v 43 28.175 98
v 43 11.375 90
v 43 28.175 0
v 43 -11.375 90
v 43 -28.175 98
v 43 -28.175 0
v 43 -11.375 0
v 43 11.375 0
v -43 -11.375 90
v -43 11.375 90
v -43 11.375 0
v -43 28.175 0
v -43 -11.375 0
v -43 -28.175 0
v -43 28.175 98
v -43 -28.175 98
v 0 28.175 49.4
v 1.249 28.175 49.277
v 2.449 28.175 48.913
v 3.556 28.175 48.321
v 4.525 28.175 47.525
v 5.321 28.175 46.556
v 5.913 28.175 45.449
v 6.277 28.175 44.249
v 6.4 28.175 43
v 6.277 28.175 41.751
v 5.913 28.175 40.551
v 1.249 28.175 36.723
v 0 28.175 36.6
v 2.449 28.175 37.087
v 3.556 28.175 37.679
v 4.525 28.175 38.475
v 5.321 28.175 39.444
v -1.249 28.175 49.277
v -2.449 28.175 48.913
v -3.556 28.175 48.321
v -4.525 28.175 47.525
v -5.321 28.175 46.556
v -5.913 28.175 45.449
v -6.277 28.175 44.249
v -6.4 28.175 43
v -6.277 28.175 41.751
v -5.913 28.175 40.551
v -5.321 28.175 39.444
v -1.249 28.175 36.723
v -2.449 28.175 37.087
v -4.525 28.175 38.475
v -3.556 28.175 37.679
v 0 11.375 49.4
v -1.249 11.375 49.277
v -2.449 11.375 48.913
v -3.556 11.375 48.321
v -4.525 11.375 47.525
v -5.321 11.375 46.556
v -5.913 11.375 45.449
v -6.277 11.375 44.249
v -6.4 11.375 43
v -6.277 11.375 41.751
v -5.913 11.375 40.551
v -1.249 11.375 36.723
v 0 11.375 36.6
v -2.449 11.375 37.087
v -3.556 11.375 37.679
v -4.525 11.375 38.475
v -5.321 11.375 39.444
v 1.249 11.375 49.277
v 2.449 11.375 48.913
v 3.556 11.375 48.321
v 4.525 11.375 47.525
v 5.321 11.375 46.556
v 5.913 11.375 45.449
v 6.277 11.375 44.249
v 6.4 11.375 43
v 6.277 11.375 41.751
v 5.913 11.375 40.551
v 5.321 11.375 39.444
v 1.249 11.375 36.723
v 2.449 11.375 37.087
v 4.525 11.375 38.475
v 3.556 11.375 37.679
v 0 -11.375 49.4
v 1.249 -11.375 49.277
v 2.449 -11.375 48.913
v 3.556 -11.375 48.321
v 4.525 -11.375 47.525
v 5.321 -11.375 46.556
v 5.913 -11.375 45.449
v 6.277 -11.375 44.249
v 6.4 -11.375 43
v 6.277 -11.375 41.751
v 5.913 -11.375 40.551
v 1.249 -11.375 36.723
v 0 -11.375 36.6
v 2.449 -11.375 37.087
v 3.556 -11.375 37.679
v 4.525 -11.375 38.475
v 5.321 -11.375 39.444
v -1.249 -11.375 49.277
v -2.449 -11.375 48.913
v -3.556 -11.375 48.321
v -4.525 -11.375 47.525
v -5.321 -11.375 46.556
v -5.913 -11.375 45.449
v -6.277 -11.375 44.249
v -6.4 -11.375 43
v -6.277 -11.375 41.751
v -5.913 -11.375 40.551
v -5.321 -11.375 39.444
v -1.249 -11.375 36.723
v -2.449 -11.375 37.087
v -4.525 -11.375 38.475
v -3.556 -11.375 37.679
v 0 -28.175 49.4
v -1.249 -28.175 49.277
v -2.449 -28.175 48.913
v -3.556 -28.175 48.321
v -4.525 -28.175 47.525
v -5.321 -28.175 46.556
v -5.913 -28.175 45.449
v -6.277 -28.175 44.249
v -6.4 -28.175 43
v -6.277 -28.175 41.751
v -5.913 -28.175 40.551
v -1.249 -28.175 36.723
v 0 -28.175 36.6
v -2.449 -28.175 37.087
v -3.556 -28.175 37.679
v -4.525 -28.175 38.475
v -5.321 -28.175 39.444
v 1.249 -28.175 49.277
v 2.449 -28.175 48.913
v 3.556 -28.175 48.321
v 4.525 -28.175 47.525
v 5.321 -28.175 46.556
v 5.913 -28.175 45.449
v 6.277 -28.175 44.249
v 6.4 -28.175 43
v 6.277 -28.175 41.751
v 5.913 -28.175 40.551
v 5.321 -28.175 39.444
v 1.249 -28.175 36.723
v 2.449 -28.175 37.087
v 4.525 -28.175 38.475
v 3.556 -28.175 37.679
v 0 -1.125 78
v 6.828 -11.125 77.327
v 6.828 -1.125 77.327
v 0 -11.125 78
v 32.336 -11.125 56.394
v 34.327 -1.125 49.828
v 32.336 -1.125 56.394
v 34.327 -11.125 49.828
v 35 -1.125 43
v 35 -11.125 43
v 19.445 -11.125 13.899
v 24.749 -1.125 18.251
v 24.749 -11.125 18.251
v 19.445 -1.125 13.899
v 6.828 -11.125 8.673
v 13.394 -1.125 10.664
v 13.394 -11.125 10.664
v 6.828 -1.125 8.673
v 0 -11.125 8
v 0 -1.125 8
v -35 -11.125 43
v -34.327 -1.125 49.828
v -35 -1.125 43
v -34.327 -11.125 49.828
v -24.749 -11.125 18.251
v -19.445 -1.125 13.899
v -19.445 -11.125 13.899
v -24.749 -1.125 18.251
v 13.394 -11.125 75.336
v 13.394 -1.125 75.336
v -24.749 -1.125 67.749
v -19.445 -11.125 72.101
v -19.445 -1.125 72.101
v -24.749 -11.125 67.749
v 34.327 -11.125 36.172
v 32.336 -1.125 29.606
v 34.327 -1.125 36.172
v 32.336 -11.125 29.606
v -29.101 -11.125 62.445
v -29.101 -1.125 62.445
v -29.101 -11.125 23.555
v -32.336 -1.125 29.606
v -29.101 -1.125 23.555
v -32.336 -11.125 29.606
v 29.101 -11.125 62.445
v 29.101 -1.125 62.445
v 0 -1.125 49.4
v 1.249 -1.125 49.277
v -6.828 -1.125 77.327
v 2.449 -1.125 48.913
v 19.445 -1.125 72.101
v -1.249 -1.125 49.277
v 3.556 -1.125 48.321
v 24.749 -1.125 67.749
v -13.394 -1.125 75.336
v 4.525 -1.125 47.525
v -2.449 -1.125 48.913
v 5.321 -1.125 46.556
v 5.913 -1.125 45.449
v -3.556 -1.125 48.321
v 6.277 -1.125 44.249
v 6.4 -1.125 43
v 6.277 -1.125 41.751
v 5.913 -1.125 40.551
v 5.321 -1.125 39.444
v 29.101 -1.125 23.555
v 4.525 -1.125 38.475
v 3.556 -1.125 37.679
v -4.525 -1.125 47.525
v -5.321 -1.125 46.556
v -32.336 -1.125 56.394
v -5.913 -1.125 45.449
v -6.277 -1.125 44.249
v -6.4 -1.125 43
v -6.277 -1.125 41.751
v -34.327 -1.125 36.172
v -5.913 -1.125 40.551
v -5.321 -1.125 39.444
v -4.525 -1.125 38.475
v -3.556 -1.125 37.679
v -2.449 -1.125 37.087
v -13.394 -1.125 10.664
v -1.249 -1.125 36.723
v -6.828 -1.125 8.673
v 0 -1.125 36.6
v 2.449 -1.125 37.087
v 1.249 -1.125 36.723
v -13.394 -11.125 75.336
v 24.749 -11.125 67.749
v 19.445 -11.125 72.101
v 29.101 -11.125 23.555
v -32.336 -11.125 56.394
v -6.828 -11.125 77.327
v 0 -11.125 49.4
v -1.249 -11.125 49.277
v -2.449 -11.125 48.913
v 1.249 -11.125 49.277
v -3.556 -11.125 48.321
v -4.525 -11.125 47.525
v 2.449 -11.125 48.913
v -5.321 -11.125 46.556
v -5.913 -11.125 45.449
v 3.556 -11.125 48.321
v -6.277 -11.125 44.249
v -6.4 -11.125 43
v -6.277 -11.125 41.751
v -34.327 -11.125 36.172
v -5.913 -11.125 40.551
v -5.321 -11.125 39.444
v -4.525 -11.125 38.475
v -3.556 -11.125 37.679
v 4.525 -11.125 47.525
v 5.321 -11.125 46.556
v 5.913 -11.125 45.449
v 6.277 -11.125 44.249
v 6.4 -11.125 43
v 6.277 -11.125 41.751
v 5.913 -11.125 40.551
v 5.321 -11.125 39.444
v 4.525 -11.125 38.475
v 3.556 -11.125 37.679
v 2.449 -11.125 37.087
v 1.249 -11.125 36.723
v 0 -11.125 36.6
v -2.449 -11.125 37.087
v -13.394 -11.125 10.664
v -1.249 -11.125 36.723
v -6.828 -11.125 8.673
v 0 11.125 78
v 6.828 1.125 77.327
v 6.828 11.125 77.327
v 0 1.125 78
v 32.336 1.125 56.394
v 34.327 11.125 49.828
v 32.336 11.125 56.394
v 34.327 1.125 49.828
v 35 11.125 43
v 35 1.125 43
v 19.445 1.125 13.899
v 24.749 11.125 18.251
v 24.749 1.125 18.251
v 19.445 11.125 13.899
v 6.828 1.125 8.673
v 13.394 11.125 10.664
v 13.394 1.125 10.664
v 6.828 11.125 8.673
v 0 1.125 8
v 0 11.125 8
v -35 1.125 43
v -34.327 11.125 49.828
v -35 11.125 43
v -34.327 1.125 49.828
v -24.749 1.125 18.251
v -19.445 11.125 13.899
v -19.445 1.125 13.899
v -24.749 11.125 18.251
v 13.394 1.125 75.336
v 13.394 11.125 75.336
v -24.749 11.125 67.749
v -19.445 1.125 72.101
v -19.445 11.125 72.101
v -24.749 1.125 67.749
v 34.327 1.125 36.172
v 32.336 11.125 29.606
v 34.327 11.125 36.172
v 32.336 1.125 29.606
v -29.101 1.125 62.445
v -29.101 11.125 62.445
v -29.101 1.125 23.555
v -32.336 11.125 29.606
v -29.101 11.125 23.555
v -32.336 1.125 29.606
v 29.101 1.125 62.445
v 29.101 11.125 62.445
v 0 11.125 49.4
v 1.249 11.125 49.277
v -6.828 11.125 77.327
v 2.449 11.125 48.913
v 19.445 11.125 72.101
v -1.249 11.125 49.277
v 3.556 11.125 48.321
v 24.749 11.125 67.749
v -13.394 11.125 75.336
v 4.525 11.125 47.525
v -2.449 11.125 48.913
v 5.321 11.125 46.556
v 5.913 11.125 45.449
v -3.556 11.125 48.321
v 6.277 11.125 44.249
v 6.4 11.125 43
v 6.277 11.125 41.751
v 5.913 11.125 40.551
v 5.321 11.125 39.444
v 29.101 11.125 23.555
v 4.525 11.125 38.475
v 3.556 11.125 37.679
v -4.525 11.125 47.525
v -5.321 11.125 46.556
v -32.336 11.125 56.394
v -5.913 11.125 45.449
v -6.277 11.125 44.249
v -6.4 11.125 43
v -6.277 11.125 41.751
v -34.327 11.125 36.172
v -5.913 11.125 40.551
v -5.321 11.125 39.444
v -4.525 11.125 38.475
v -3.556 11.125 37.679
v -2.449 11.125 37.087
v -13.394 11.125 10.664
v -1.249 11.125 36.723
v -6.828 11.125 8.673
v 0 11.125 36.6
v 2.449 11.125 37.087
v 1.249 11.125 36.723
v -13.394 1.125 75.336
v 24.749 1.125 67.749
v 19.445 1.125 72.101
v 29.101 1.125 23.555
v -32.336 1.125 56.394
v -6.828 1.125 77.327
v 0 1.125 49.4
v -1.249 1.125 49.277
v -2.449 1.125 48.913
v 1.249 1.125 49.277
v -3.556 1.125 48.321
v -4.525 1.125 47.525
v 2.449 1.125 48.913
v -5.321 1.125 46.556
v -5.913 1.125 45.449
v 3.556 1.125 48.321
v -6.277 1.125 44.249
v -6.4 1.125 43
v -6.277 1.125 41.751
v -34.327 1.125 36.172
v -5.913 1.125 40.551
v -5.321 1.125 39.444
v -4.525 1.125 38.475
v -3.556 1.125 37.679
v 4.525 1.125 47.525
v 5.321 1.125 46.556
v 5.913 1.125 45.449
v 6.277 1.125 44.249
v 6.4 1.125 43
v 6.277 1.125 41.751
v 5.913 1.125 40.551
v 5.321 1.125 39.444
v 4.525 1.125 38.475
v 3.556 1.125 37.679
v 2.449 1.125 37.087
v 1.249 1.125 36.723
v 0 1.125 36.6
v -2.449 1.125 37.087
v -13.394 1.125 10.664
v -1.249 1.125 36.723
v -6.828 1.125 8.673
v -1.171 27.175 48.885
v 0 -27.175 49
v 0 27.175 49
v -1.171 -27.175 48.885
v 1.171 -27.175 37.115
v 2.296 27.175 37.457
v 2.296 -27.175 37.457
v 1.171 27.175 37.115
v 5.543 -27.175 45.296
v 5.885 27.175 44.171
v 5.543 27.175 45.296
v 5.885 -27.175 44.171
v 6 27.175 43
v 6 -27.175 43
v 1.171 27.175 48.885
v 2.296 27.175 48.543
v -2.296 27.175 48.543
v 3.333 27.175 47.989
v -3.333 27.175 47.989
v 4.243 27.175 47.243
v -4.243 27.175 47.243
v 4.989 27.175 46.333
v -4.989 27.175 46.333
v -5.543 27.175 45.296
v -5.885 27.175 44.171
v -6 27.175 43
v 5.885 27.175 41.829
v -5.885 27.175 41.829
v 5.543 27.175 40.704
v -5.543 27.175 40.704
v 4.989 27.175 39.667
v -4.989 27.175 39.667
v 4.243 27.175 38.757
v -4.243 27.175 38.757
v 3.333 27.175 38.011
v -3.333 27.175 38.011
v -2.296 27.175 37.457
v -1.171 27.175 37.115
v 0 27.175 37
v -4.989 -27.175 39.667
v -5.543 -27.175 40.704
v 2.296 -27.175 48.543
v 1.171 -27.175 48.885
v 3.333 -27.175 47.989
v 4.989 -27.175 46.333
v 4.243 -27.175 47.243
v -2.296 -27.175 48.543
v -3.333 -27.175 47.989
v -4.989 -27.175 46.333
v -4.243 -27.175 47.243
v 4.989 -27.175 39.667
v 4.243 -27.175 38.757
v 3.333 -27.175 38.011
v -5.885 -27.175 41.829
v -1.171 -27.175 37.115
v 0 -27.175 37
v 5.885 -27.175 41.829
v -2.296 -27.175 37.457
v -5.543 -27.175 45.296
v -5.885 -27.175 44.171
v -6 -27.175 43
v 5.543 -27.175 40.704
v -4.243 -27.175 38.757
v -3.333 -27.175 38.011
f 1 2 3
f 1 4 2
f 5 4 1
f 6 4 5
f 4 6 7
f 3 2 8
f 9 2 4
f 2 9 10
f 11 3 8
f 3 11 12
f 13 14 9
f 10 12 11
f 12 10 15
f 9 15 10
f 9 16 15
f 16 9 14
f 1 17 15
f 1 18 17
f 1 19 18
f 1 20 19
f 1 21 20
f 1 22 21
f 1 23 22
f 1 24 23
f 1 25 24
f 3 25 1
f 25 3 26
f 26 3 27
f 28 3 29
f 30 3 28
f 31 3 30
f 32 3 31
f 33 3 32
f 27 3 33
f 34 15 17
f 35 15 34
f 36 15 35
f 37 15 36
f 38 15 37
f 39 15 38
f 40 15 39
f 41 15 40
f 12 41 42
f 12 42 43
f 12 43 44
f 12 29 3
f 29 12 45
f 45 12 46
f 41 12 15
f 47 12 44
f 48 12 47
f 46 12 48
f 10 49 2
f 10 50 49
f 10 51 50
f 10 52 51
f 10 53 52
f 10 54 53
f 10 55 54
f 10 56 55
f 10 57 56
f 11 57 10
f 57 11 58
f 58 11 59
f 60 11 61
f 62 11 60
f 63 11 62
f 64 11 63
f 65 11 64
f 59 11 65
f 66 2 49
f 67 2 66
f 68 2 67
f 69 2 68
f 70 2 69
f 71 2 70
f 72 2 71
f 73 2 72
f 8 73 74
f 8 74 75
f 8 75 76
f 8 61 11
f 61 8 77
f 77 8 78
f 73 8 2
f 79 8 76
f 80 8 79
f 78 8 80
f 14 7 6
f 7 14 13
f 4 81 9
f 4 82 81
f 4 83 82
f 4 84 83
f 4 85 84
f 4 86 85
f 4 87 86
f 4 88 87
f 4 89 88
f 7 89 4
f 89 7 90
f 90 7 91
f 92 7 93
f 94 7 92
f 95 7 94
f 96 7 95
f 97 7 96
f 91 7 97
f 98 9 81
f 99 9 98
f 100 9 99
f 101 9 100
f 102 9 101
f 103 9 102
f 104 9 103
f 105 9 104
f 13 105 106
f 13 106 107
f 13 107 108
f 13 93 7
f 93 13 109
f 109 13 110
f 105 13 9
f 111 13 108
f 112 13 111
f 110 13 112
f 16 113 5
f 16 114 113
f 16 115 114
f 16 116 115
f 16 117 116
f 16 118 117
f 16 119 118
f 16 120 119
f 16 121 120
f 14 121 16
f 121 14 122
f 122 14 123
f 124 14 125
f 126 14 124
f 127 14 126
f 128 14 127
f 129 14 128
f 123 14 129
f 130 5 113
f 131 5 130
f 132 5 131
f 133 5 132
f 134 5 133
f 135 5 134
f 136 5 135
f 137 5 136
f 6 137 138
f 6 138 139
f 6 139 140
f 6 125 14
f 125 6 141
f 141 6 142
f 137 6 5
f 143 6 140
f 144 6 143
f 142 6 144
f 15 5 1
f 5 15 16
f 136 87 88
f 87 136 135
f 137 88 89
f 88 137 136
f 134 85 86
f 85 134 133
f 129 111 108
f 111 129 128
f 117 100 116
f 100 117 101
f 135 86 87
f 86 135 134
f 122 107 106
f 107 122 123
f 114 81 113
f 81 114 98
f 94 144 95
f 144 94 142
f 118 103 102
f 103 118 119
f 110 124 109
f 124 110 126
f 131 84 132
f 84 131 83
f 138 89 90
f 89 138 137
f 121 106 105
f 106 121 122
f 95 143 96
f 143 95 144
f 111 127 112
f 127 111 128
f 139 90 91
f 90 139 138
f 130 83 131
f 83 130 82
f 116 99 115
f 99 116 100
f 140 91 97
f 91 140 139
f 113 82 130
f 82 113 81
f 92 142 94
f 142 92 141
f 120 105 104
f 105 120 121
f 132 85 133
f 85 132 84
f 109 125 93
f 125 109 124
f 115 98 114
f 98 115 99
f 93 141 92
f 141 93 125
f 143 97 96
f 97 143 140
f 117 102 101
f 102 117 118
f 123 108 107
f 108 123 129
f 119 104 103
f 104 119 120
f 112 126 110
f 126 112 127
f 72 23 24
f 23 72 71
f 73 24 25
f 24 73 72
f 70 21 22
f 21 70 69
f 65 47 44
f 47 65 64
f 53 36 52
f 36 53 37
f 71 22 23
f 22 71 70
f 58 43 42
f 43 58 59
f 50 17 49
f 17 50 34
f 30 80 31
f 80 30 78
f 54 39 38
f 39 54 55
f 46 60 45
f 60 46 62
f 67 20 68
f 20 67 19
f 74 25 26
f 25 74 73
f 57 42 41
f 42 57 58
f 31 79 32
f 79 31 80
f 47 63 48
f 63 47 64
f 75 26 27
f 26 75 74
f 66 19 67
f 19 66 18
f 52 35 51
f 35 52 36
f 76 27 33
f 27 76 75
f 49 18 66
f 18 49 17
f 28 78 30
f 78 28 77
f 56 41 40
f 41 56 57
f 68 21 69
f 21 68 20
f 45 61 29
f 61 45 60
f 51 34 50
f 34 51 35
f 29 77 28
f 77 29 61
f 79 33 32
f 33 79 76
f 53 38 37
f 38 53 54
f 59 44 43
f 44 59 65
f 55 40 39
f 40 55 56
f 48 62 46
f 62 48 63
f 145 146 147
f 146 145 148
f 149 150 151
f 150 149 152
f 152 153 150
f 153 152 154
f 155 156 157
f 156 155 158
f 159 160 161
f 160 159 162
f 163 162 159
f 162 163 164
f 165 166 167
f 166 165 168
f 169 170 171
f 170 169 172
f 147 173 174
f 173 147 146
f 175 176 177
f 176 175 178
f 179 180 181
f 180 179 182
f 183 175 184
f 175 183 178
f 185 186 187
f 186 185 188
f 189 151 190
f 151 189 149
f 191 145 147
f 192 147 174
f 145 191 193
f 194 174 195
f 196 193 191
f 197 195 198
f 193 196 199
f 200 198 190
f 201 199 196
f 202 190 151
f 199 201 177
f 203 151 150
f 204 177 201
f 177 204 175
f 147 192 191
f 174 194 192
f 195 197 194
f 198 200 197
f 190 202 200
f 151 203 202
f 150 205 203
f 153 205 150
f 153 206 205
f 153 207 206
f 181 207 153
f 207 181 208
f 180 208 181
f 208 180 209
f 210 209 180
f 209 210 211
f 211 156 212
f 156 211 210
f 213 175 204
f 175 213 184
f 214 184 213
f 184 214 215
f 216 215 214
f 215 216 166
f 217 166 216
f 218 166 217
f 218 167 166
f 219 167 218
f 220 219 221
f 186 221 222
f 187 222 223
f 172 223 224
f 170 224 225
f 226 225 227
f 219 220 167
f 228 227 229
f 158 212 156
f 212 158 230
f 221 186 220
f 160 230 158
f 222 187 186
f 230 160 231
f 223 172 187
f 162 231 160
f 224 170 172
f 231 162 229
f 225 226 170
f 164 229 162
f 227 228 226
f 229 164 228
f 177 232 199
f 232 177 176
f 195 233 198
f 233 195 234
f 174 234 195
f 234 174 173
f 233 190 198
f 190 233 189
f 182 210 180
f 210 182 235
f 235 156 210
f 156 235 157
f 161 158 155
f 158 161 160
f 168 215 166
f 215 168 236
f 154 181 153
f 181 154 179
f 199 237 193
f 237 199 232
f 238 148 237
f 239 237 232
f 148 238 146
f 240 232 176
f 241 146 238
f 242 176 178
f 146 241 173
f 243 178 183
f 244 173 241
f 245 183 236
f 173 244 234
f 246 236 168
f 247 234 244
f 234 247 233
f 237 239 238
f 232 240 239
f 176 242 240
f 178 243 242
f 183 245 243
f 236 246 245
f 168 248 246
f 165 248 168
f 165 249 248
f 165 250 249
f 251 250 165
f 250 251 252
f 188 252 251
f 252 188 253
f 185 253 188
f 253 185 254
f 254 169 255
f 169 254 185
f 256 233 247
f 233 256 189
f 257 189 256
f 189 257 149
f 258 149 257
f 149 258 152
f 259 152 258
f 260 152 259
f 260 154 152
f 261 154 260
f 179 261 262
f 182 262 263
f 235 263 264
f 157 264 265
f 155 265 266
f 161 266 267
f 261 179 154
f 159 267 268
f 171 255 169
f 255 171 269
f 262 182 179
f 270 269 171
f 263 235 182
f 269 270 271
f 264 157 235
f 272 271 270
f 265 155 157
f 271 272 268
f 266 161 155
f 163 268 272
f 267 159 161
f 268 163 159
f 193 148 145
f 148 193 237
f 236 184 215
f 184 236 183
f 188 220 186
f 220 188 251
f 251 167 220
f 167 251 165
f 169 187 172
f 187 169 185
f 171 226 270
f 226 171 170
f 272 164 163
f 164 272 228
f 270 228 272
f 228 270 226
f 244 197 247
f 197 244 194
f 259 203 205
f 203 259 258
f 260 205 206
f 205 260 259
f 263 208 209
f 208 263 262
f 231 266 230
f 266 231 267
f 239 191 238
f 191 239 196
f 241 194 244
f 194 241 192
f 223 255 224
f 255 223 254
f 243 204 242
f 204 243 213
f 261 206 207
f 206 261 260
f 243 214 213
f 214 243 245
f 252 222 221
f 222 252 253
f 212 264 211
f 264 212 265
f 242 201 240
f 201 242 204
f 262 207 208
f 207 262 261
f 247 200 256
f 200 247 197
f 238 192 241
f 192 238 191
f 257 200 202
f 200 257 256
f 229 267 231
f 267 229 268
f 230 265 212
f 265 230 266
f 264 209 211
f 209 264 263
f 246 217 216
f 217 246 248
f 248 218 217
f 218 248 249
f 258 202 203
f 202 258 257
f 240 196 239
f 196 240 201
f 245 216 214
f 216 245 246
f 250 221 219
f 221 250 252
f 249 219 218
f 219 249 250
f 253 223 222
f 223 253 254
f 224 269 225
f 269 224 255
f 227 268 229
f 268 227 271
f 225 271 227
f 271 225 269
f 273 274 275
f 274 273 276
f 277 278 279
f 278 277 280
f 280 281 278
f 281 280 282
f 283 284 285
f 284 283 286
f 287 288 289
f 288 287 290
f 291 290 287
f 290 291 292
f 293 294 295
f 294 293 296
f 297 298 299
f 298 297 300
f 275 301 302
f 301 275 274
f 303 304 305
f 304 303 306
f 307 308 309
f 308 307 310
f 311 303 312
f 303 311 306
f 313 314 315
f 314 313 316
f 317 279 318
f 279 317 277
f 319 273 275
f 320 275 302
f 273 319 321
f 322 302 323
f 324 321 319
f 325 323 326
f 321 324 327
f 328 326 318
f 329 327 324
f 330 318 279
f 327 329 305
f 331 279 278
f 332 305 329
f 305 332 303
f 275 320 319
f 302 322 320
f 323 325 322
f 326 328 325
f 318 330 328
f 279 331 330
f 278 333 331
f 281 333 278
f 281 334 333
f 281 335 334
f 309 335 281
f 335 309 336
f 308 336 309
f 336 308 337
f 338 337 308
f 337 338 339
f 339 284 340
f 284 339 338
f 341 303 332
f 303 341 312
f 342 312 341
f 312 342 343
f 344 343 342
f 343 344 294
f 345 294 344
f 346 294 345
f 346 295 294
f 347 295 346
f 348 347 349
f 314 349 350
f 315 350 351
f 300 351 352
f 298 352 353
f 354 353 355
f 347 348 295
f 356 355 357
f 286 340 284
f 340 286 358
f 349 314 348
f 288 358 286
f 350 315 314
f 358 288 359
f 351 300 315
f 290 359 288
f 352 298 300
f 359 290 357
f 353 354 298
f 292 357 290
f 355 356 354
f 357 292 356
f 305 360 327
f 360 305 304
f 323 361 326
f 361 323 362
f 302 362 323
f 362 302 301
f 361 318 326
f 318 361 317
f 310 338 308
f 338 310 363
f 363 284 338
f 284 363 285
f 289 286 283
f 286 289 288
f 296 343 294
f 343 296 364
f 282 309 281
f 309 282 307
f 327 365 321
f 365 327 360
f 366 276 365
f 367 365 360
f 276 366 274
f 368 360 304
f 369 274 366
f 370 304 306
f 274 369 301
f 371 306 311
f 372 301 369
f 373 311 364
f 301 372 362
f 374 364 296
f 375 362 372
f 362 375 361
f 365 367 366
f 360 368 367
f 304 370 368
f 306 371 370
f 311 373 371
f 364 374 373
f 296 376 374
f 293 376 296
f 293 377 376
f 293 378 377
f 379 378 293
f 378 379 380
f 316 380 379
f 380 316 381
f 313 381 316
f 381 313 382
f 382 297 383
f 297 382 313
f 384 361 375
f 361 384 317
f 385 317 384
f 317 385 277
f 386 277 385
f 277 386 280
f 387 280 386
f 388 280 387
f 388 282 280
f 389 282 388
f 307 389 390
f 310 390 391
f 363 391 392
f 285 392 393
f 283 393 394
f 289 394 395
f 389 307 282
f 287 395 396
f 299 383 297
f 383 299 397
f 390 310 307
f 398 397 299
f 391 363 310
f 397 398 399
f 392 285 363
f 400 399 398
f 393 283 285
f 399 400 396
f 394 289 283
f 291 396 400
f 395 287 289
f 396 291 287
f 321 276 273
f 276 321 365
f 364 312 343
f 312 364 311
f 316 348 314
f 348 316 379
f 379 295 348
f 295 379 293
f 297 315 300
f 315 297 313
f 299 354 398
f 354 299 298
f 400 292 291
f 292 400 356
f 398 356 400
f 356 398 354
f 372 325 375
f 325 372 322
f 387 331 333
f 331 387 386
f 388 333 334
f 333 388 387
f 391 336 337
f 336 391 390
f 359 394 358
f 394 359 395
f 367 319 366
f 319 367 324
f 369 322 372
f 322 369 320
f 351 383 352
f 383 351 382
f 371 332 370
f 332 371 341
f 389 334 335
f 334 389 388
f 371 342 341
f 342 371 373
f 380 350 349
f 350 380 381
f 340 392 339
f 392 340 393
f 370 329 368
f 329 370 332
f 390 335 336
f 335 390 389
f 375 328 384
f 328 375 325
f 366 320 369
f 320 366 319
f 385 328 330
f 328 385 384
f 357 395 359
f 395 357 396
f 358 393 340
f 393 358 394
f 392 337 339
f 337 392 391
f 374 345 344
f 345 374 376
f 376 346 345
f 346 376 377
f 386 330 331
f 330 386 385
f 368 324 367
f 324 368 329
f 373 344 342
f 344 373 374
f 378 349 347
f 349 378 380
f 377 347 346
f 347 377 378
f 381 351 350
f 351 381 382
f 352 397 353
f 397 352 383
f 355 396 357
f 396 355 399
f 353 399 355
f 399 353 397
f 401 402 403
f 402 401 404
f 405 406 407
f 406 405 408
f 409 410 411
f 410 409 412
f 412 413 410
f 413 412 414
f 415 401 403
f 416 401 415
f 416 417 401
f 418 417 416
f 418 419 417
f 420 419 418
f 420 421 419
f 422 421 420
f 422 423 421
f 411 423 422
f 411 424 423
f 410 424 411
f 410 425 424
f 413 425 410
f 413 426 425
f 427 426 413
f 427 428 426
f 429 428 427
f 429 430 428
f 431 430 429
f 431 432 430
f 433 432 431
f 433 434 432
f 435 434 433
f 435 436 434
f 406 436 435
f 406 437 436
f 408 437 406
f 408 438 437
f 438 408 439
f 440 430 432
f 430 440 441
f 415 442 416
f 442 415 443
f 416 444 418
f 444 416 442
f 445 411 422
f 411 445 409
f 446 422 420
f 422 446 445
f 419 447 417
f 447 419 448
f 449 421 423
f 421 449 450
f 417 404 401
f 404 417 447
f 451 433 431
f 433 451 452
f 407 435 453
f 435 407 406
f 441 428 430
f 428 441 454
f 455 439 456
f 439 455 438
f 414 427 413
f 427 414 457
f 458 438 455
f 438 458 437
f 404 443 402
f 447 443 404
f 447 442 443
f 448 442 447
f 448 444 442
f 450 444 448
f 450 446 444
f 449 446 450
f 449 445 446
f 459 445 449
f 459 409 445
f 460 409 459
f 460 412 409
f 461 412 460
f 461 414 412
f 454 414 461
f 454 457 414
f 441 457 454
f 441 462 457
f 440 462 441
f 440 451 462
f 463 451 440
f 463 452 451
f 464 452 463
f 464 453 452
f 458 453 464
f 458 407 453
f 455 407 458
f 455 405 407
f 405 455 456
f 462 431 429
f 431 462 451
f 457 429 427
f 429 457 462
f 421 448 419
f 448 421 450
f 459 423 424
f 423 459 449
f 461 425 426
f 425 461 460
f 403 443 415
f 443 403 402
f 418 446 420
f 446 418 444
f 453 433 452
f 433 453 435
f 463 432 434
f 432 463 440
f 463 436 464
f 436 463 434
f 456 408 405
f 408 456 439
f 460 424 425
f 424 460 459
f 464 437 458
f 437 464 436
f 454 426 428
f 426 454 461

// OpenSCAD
$fn = 32;

// ------------------------------------------------------------------------
// Trolley wheel set: wheels d70, fork 90 mm tall
// Every part is its own module, assembly() places every instance.
// ------------------------------------------------------------------------

// --- part 1 ---
module trolley_fork() {
  difference() {
    union() {
      translate([-43, 11.375, 0]) cube([86, 16.8, 90]);
      translate([-43, -28.175, 0]) cube([86, 16.8, 90]);
      translate([-43, -28.175, 90]) cube([86, 56.35, 8]);
    }
    translate([0, -19.775, 43]) rotate([90, 0, 0]) cylinder(h = 18.8, d = 12.8, center = true);
    translate([0, 19.775, 43]) rotate([90, 0, 0]) cylinder(h = 18.8, d = 12.8, center = true);
  }
}

// --- part 2 ---
module trolley_wheel() {
  difference() {
      translate([0, 0, 0]) cylinder(h = 10, d = 70);
      translate([0, 0, -1]) cylinder(h = 12, d = 12.8);
    }
}

// --- part 3 ---
module trolley_axle() {
  translate([0, 0, -27.175]) cylinder(h = 54.35, d = 12);
}

// --- assembly ---
module assembly() {
  color([0.80, 0.24, 0.20]) translate([0, 0, 0]) rotate([0, 0, 0]) trolley_fork();
  color([0.20, 0.45, 0.75]) translate([0, -1.125, 43]) rotate([90, 0, 0]) trolley_wheel();
  color([0.25, 0.62, 0.32]) translate([0, 11.125, 43]) rotate([90, 0, 0]) trolley_wheel();
  color([0.92, 0.70, 0.18]) translate([0, 0, 43]) rotate([90, 0, 0]) trolley_axle();
}

assembly();
